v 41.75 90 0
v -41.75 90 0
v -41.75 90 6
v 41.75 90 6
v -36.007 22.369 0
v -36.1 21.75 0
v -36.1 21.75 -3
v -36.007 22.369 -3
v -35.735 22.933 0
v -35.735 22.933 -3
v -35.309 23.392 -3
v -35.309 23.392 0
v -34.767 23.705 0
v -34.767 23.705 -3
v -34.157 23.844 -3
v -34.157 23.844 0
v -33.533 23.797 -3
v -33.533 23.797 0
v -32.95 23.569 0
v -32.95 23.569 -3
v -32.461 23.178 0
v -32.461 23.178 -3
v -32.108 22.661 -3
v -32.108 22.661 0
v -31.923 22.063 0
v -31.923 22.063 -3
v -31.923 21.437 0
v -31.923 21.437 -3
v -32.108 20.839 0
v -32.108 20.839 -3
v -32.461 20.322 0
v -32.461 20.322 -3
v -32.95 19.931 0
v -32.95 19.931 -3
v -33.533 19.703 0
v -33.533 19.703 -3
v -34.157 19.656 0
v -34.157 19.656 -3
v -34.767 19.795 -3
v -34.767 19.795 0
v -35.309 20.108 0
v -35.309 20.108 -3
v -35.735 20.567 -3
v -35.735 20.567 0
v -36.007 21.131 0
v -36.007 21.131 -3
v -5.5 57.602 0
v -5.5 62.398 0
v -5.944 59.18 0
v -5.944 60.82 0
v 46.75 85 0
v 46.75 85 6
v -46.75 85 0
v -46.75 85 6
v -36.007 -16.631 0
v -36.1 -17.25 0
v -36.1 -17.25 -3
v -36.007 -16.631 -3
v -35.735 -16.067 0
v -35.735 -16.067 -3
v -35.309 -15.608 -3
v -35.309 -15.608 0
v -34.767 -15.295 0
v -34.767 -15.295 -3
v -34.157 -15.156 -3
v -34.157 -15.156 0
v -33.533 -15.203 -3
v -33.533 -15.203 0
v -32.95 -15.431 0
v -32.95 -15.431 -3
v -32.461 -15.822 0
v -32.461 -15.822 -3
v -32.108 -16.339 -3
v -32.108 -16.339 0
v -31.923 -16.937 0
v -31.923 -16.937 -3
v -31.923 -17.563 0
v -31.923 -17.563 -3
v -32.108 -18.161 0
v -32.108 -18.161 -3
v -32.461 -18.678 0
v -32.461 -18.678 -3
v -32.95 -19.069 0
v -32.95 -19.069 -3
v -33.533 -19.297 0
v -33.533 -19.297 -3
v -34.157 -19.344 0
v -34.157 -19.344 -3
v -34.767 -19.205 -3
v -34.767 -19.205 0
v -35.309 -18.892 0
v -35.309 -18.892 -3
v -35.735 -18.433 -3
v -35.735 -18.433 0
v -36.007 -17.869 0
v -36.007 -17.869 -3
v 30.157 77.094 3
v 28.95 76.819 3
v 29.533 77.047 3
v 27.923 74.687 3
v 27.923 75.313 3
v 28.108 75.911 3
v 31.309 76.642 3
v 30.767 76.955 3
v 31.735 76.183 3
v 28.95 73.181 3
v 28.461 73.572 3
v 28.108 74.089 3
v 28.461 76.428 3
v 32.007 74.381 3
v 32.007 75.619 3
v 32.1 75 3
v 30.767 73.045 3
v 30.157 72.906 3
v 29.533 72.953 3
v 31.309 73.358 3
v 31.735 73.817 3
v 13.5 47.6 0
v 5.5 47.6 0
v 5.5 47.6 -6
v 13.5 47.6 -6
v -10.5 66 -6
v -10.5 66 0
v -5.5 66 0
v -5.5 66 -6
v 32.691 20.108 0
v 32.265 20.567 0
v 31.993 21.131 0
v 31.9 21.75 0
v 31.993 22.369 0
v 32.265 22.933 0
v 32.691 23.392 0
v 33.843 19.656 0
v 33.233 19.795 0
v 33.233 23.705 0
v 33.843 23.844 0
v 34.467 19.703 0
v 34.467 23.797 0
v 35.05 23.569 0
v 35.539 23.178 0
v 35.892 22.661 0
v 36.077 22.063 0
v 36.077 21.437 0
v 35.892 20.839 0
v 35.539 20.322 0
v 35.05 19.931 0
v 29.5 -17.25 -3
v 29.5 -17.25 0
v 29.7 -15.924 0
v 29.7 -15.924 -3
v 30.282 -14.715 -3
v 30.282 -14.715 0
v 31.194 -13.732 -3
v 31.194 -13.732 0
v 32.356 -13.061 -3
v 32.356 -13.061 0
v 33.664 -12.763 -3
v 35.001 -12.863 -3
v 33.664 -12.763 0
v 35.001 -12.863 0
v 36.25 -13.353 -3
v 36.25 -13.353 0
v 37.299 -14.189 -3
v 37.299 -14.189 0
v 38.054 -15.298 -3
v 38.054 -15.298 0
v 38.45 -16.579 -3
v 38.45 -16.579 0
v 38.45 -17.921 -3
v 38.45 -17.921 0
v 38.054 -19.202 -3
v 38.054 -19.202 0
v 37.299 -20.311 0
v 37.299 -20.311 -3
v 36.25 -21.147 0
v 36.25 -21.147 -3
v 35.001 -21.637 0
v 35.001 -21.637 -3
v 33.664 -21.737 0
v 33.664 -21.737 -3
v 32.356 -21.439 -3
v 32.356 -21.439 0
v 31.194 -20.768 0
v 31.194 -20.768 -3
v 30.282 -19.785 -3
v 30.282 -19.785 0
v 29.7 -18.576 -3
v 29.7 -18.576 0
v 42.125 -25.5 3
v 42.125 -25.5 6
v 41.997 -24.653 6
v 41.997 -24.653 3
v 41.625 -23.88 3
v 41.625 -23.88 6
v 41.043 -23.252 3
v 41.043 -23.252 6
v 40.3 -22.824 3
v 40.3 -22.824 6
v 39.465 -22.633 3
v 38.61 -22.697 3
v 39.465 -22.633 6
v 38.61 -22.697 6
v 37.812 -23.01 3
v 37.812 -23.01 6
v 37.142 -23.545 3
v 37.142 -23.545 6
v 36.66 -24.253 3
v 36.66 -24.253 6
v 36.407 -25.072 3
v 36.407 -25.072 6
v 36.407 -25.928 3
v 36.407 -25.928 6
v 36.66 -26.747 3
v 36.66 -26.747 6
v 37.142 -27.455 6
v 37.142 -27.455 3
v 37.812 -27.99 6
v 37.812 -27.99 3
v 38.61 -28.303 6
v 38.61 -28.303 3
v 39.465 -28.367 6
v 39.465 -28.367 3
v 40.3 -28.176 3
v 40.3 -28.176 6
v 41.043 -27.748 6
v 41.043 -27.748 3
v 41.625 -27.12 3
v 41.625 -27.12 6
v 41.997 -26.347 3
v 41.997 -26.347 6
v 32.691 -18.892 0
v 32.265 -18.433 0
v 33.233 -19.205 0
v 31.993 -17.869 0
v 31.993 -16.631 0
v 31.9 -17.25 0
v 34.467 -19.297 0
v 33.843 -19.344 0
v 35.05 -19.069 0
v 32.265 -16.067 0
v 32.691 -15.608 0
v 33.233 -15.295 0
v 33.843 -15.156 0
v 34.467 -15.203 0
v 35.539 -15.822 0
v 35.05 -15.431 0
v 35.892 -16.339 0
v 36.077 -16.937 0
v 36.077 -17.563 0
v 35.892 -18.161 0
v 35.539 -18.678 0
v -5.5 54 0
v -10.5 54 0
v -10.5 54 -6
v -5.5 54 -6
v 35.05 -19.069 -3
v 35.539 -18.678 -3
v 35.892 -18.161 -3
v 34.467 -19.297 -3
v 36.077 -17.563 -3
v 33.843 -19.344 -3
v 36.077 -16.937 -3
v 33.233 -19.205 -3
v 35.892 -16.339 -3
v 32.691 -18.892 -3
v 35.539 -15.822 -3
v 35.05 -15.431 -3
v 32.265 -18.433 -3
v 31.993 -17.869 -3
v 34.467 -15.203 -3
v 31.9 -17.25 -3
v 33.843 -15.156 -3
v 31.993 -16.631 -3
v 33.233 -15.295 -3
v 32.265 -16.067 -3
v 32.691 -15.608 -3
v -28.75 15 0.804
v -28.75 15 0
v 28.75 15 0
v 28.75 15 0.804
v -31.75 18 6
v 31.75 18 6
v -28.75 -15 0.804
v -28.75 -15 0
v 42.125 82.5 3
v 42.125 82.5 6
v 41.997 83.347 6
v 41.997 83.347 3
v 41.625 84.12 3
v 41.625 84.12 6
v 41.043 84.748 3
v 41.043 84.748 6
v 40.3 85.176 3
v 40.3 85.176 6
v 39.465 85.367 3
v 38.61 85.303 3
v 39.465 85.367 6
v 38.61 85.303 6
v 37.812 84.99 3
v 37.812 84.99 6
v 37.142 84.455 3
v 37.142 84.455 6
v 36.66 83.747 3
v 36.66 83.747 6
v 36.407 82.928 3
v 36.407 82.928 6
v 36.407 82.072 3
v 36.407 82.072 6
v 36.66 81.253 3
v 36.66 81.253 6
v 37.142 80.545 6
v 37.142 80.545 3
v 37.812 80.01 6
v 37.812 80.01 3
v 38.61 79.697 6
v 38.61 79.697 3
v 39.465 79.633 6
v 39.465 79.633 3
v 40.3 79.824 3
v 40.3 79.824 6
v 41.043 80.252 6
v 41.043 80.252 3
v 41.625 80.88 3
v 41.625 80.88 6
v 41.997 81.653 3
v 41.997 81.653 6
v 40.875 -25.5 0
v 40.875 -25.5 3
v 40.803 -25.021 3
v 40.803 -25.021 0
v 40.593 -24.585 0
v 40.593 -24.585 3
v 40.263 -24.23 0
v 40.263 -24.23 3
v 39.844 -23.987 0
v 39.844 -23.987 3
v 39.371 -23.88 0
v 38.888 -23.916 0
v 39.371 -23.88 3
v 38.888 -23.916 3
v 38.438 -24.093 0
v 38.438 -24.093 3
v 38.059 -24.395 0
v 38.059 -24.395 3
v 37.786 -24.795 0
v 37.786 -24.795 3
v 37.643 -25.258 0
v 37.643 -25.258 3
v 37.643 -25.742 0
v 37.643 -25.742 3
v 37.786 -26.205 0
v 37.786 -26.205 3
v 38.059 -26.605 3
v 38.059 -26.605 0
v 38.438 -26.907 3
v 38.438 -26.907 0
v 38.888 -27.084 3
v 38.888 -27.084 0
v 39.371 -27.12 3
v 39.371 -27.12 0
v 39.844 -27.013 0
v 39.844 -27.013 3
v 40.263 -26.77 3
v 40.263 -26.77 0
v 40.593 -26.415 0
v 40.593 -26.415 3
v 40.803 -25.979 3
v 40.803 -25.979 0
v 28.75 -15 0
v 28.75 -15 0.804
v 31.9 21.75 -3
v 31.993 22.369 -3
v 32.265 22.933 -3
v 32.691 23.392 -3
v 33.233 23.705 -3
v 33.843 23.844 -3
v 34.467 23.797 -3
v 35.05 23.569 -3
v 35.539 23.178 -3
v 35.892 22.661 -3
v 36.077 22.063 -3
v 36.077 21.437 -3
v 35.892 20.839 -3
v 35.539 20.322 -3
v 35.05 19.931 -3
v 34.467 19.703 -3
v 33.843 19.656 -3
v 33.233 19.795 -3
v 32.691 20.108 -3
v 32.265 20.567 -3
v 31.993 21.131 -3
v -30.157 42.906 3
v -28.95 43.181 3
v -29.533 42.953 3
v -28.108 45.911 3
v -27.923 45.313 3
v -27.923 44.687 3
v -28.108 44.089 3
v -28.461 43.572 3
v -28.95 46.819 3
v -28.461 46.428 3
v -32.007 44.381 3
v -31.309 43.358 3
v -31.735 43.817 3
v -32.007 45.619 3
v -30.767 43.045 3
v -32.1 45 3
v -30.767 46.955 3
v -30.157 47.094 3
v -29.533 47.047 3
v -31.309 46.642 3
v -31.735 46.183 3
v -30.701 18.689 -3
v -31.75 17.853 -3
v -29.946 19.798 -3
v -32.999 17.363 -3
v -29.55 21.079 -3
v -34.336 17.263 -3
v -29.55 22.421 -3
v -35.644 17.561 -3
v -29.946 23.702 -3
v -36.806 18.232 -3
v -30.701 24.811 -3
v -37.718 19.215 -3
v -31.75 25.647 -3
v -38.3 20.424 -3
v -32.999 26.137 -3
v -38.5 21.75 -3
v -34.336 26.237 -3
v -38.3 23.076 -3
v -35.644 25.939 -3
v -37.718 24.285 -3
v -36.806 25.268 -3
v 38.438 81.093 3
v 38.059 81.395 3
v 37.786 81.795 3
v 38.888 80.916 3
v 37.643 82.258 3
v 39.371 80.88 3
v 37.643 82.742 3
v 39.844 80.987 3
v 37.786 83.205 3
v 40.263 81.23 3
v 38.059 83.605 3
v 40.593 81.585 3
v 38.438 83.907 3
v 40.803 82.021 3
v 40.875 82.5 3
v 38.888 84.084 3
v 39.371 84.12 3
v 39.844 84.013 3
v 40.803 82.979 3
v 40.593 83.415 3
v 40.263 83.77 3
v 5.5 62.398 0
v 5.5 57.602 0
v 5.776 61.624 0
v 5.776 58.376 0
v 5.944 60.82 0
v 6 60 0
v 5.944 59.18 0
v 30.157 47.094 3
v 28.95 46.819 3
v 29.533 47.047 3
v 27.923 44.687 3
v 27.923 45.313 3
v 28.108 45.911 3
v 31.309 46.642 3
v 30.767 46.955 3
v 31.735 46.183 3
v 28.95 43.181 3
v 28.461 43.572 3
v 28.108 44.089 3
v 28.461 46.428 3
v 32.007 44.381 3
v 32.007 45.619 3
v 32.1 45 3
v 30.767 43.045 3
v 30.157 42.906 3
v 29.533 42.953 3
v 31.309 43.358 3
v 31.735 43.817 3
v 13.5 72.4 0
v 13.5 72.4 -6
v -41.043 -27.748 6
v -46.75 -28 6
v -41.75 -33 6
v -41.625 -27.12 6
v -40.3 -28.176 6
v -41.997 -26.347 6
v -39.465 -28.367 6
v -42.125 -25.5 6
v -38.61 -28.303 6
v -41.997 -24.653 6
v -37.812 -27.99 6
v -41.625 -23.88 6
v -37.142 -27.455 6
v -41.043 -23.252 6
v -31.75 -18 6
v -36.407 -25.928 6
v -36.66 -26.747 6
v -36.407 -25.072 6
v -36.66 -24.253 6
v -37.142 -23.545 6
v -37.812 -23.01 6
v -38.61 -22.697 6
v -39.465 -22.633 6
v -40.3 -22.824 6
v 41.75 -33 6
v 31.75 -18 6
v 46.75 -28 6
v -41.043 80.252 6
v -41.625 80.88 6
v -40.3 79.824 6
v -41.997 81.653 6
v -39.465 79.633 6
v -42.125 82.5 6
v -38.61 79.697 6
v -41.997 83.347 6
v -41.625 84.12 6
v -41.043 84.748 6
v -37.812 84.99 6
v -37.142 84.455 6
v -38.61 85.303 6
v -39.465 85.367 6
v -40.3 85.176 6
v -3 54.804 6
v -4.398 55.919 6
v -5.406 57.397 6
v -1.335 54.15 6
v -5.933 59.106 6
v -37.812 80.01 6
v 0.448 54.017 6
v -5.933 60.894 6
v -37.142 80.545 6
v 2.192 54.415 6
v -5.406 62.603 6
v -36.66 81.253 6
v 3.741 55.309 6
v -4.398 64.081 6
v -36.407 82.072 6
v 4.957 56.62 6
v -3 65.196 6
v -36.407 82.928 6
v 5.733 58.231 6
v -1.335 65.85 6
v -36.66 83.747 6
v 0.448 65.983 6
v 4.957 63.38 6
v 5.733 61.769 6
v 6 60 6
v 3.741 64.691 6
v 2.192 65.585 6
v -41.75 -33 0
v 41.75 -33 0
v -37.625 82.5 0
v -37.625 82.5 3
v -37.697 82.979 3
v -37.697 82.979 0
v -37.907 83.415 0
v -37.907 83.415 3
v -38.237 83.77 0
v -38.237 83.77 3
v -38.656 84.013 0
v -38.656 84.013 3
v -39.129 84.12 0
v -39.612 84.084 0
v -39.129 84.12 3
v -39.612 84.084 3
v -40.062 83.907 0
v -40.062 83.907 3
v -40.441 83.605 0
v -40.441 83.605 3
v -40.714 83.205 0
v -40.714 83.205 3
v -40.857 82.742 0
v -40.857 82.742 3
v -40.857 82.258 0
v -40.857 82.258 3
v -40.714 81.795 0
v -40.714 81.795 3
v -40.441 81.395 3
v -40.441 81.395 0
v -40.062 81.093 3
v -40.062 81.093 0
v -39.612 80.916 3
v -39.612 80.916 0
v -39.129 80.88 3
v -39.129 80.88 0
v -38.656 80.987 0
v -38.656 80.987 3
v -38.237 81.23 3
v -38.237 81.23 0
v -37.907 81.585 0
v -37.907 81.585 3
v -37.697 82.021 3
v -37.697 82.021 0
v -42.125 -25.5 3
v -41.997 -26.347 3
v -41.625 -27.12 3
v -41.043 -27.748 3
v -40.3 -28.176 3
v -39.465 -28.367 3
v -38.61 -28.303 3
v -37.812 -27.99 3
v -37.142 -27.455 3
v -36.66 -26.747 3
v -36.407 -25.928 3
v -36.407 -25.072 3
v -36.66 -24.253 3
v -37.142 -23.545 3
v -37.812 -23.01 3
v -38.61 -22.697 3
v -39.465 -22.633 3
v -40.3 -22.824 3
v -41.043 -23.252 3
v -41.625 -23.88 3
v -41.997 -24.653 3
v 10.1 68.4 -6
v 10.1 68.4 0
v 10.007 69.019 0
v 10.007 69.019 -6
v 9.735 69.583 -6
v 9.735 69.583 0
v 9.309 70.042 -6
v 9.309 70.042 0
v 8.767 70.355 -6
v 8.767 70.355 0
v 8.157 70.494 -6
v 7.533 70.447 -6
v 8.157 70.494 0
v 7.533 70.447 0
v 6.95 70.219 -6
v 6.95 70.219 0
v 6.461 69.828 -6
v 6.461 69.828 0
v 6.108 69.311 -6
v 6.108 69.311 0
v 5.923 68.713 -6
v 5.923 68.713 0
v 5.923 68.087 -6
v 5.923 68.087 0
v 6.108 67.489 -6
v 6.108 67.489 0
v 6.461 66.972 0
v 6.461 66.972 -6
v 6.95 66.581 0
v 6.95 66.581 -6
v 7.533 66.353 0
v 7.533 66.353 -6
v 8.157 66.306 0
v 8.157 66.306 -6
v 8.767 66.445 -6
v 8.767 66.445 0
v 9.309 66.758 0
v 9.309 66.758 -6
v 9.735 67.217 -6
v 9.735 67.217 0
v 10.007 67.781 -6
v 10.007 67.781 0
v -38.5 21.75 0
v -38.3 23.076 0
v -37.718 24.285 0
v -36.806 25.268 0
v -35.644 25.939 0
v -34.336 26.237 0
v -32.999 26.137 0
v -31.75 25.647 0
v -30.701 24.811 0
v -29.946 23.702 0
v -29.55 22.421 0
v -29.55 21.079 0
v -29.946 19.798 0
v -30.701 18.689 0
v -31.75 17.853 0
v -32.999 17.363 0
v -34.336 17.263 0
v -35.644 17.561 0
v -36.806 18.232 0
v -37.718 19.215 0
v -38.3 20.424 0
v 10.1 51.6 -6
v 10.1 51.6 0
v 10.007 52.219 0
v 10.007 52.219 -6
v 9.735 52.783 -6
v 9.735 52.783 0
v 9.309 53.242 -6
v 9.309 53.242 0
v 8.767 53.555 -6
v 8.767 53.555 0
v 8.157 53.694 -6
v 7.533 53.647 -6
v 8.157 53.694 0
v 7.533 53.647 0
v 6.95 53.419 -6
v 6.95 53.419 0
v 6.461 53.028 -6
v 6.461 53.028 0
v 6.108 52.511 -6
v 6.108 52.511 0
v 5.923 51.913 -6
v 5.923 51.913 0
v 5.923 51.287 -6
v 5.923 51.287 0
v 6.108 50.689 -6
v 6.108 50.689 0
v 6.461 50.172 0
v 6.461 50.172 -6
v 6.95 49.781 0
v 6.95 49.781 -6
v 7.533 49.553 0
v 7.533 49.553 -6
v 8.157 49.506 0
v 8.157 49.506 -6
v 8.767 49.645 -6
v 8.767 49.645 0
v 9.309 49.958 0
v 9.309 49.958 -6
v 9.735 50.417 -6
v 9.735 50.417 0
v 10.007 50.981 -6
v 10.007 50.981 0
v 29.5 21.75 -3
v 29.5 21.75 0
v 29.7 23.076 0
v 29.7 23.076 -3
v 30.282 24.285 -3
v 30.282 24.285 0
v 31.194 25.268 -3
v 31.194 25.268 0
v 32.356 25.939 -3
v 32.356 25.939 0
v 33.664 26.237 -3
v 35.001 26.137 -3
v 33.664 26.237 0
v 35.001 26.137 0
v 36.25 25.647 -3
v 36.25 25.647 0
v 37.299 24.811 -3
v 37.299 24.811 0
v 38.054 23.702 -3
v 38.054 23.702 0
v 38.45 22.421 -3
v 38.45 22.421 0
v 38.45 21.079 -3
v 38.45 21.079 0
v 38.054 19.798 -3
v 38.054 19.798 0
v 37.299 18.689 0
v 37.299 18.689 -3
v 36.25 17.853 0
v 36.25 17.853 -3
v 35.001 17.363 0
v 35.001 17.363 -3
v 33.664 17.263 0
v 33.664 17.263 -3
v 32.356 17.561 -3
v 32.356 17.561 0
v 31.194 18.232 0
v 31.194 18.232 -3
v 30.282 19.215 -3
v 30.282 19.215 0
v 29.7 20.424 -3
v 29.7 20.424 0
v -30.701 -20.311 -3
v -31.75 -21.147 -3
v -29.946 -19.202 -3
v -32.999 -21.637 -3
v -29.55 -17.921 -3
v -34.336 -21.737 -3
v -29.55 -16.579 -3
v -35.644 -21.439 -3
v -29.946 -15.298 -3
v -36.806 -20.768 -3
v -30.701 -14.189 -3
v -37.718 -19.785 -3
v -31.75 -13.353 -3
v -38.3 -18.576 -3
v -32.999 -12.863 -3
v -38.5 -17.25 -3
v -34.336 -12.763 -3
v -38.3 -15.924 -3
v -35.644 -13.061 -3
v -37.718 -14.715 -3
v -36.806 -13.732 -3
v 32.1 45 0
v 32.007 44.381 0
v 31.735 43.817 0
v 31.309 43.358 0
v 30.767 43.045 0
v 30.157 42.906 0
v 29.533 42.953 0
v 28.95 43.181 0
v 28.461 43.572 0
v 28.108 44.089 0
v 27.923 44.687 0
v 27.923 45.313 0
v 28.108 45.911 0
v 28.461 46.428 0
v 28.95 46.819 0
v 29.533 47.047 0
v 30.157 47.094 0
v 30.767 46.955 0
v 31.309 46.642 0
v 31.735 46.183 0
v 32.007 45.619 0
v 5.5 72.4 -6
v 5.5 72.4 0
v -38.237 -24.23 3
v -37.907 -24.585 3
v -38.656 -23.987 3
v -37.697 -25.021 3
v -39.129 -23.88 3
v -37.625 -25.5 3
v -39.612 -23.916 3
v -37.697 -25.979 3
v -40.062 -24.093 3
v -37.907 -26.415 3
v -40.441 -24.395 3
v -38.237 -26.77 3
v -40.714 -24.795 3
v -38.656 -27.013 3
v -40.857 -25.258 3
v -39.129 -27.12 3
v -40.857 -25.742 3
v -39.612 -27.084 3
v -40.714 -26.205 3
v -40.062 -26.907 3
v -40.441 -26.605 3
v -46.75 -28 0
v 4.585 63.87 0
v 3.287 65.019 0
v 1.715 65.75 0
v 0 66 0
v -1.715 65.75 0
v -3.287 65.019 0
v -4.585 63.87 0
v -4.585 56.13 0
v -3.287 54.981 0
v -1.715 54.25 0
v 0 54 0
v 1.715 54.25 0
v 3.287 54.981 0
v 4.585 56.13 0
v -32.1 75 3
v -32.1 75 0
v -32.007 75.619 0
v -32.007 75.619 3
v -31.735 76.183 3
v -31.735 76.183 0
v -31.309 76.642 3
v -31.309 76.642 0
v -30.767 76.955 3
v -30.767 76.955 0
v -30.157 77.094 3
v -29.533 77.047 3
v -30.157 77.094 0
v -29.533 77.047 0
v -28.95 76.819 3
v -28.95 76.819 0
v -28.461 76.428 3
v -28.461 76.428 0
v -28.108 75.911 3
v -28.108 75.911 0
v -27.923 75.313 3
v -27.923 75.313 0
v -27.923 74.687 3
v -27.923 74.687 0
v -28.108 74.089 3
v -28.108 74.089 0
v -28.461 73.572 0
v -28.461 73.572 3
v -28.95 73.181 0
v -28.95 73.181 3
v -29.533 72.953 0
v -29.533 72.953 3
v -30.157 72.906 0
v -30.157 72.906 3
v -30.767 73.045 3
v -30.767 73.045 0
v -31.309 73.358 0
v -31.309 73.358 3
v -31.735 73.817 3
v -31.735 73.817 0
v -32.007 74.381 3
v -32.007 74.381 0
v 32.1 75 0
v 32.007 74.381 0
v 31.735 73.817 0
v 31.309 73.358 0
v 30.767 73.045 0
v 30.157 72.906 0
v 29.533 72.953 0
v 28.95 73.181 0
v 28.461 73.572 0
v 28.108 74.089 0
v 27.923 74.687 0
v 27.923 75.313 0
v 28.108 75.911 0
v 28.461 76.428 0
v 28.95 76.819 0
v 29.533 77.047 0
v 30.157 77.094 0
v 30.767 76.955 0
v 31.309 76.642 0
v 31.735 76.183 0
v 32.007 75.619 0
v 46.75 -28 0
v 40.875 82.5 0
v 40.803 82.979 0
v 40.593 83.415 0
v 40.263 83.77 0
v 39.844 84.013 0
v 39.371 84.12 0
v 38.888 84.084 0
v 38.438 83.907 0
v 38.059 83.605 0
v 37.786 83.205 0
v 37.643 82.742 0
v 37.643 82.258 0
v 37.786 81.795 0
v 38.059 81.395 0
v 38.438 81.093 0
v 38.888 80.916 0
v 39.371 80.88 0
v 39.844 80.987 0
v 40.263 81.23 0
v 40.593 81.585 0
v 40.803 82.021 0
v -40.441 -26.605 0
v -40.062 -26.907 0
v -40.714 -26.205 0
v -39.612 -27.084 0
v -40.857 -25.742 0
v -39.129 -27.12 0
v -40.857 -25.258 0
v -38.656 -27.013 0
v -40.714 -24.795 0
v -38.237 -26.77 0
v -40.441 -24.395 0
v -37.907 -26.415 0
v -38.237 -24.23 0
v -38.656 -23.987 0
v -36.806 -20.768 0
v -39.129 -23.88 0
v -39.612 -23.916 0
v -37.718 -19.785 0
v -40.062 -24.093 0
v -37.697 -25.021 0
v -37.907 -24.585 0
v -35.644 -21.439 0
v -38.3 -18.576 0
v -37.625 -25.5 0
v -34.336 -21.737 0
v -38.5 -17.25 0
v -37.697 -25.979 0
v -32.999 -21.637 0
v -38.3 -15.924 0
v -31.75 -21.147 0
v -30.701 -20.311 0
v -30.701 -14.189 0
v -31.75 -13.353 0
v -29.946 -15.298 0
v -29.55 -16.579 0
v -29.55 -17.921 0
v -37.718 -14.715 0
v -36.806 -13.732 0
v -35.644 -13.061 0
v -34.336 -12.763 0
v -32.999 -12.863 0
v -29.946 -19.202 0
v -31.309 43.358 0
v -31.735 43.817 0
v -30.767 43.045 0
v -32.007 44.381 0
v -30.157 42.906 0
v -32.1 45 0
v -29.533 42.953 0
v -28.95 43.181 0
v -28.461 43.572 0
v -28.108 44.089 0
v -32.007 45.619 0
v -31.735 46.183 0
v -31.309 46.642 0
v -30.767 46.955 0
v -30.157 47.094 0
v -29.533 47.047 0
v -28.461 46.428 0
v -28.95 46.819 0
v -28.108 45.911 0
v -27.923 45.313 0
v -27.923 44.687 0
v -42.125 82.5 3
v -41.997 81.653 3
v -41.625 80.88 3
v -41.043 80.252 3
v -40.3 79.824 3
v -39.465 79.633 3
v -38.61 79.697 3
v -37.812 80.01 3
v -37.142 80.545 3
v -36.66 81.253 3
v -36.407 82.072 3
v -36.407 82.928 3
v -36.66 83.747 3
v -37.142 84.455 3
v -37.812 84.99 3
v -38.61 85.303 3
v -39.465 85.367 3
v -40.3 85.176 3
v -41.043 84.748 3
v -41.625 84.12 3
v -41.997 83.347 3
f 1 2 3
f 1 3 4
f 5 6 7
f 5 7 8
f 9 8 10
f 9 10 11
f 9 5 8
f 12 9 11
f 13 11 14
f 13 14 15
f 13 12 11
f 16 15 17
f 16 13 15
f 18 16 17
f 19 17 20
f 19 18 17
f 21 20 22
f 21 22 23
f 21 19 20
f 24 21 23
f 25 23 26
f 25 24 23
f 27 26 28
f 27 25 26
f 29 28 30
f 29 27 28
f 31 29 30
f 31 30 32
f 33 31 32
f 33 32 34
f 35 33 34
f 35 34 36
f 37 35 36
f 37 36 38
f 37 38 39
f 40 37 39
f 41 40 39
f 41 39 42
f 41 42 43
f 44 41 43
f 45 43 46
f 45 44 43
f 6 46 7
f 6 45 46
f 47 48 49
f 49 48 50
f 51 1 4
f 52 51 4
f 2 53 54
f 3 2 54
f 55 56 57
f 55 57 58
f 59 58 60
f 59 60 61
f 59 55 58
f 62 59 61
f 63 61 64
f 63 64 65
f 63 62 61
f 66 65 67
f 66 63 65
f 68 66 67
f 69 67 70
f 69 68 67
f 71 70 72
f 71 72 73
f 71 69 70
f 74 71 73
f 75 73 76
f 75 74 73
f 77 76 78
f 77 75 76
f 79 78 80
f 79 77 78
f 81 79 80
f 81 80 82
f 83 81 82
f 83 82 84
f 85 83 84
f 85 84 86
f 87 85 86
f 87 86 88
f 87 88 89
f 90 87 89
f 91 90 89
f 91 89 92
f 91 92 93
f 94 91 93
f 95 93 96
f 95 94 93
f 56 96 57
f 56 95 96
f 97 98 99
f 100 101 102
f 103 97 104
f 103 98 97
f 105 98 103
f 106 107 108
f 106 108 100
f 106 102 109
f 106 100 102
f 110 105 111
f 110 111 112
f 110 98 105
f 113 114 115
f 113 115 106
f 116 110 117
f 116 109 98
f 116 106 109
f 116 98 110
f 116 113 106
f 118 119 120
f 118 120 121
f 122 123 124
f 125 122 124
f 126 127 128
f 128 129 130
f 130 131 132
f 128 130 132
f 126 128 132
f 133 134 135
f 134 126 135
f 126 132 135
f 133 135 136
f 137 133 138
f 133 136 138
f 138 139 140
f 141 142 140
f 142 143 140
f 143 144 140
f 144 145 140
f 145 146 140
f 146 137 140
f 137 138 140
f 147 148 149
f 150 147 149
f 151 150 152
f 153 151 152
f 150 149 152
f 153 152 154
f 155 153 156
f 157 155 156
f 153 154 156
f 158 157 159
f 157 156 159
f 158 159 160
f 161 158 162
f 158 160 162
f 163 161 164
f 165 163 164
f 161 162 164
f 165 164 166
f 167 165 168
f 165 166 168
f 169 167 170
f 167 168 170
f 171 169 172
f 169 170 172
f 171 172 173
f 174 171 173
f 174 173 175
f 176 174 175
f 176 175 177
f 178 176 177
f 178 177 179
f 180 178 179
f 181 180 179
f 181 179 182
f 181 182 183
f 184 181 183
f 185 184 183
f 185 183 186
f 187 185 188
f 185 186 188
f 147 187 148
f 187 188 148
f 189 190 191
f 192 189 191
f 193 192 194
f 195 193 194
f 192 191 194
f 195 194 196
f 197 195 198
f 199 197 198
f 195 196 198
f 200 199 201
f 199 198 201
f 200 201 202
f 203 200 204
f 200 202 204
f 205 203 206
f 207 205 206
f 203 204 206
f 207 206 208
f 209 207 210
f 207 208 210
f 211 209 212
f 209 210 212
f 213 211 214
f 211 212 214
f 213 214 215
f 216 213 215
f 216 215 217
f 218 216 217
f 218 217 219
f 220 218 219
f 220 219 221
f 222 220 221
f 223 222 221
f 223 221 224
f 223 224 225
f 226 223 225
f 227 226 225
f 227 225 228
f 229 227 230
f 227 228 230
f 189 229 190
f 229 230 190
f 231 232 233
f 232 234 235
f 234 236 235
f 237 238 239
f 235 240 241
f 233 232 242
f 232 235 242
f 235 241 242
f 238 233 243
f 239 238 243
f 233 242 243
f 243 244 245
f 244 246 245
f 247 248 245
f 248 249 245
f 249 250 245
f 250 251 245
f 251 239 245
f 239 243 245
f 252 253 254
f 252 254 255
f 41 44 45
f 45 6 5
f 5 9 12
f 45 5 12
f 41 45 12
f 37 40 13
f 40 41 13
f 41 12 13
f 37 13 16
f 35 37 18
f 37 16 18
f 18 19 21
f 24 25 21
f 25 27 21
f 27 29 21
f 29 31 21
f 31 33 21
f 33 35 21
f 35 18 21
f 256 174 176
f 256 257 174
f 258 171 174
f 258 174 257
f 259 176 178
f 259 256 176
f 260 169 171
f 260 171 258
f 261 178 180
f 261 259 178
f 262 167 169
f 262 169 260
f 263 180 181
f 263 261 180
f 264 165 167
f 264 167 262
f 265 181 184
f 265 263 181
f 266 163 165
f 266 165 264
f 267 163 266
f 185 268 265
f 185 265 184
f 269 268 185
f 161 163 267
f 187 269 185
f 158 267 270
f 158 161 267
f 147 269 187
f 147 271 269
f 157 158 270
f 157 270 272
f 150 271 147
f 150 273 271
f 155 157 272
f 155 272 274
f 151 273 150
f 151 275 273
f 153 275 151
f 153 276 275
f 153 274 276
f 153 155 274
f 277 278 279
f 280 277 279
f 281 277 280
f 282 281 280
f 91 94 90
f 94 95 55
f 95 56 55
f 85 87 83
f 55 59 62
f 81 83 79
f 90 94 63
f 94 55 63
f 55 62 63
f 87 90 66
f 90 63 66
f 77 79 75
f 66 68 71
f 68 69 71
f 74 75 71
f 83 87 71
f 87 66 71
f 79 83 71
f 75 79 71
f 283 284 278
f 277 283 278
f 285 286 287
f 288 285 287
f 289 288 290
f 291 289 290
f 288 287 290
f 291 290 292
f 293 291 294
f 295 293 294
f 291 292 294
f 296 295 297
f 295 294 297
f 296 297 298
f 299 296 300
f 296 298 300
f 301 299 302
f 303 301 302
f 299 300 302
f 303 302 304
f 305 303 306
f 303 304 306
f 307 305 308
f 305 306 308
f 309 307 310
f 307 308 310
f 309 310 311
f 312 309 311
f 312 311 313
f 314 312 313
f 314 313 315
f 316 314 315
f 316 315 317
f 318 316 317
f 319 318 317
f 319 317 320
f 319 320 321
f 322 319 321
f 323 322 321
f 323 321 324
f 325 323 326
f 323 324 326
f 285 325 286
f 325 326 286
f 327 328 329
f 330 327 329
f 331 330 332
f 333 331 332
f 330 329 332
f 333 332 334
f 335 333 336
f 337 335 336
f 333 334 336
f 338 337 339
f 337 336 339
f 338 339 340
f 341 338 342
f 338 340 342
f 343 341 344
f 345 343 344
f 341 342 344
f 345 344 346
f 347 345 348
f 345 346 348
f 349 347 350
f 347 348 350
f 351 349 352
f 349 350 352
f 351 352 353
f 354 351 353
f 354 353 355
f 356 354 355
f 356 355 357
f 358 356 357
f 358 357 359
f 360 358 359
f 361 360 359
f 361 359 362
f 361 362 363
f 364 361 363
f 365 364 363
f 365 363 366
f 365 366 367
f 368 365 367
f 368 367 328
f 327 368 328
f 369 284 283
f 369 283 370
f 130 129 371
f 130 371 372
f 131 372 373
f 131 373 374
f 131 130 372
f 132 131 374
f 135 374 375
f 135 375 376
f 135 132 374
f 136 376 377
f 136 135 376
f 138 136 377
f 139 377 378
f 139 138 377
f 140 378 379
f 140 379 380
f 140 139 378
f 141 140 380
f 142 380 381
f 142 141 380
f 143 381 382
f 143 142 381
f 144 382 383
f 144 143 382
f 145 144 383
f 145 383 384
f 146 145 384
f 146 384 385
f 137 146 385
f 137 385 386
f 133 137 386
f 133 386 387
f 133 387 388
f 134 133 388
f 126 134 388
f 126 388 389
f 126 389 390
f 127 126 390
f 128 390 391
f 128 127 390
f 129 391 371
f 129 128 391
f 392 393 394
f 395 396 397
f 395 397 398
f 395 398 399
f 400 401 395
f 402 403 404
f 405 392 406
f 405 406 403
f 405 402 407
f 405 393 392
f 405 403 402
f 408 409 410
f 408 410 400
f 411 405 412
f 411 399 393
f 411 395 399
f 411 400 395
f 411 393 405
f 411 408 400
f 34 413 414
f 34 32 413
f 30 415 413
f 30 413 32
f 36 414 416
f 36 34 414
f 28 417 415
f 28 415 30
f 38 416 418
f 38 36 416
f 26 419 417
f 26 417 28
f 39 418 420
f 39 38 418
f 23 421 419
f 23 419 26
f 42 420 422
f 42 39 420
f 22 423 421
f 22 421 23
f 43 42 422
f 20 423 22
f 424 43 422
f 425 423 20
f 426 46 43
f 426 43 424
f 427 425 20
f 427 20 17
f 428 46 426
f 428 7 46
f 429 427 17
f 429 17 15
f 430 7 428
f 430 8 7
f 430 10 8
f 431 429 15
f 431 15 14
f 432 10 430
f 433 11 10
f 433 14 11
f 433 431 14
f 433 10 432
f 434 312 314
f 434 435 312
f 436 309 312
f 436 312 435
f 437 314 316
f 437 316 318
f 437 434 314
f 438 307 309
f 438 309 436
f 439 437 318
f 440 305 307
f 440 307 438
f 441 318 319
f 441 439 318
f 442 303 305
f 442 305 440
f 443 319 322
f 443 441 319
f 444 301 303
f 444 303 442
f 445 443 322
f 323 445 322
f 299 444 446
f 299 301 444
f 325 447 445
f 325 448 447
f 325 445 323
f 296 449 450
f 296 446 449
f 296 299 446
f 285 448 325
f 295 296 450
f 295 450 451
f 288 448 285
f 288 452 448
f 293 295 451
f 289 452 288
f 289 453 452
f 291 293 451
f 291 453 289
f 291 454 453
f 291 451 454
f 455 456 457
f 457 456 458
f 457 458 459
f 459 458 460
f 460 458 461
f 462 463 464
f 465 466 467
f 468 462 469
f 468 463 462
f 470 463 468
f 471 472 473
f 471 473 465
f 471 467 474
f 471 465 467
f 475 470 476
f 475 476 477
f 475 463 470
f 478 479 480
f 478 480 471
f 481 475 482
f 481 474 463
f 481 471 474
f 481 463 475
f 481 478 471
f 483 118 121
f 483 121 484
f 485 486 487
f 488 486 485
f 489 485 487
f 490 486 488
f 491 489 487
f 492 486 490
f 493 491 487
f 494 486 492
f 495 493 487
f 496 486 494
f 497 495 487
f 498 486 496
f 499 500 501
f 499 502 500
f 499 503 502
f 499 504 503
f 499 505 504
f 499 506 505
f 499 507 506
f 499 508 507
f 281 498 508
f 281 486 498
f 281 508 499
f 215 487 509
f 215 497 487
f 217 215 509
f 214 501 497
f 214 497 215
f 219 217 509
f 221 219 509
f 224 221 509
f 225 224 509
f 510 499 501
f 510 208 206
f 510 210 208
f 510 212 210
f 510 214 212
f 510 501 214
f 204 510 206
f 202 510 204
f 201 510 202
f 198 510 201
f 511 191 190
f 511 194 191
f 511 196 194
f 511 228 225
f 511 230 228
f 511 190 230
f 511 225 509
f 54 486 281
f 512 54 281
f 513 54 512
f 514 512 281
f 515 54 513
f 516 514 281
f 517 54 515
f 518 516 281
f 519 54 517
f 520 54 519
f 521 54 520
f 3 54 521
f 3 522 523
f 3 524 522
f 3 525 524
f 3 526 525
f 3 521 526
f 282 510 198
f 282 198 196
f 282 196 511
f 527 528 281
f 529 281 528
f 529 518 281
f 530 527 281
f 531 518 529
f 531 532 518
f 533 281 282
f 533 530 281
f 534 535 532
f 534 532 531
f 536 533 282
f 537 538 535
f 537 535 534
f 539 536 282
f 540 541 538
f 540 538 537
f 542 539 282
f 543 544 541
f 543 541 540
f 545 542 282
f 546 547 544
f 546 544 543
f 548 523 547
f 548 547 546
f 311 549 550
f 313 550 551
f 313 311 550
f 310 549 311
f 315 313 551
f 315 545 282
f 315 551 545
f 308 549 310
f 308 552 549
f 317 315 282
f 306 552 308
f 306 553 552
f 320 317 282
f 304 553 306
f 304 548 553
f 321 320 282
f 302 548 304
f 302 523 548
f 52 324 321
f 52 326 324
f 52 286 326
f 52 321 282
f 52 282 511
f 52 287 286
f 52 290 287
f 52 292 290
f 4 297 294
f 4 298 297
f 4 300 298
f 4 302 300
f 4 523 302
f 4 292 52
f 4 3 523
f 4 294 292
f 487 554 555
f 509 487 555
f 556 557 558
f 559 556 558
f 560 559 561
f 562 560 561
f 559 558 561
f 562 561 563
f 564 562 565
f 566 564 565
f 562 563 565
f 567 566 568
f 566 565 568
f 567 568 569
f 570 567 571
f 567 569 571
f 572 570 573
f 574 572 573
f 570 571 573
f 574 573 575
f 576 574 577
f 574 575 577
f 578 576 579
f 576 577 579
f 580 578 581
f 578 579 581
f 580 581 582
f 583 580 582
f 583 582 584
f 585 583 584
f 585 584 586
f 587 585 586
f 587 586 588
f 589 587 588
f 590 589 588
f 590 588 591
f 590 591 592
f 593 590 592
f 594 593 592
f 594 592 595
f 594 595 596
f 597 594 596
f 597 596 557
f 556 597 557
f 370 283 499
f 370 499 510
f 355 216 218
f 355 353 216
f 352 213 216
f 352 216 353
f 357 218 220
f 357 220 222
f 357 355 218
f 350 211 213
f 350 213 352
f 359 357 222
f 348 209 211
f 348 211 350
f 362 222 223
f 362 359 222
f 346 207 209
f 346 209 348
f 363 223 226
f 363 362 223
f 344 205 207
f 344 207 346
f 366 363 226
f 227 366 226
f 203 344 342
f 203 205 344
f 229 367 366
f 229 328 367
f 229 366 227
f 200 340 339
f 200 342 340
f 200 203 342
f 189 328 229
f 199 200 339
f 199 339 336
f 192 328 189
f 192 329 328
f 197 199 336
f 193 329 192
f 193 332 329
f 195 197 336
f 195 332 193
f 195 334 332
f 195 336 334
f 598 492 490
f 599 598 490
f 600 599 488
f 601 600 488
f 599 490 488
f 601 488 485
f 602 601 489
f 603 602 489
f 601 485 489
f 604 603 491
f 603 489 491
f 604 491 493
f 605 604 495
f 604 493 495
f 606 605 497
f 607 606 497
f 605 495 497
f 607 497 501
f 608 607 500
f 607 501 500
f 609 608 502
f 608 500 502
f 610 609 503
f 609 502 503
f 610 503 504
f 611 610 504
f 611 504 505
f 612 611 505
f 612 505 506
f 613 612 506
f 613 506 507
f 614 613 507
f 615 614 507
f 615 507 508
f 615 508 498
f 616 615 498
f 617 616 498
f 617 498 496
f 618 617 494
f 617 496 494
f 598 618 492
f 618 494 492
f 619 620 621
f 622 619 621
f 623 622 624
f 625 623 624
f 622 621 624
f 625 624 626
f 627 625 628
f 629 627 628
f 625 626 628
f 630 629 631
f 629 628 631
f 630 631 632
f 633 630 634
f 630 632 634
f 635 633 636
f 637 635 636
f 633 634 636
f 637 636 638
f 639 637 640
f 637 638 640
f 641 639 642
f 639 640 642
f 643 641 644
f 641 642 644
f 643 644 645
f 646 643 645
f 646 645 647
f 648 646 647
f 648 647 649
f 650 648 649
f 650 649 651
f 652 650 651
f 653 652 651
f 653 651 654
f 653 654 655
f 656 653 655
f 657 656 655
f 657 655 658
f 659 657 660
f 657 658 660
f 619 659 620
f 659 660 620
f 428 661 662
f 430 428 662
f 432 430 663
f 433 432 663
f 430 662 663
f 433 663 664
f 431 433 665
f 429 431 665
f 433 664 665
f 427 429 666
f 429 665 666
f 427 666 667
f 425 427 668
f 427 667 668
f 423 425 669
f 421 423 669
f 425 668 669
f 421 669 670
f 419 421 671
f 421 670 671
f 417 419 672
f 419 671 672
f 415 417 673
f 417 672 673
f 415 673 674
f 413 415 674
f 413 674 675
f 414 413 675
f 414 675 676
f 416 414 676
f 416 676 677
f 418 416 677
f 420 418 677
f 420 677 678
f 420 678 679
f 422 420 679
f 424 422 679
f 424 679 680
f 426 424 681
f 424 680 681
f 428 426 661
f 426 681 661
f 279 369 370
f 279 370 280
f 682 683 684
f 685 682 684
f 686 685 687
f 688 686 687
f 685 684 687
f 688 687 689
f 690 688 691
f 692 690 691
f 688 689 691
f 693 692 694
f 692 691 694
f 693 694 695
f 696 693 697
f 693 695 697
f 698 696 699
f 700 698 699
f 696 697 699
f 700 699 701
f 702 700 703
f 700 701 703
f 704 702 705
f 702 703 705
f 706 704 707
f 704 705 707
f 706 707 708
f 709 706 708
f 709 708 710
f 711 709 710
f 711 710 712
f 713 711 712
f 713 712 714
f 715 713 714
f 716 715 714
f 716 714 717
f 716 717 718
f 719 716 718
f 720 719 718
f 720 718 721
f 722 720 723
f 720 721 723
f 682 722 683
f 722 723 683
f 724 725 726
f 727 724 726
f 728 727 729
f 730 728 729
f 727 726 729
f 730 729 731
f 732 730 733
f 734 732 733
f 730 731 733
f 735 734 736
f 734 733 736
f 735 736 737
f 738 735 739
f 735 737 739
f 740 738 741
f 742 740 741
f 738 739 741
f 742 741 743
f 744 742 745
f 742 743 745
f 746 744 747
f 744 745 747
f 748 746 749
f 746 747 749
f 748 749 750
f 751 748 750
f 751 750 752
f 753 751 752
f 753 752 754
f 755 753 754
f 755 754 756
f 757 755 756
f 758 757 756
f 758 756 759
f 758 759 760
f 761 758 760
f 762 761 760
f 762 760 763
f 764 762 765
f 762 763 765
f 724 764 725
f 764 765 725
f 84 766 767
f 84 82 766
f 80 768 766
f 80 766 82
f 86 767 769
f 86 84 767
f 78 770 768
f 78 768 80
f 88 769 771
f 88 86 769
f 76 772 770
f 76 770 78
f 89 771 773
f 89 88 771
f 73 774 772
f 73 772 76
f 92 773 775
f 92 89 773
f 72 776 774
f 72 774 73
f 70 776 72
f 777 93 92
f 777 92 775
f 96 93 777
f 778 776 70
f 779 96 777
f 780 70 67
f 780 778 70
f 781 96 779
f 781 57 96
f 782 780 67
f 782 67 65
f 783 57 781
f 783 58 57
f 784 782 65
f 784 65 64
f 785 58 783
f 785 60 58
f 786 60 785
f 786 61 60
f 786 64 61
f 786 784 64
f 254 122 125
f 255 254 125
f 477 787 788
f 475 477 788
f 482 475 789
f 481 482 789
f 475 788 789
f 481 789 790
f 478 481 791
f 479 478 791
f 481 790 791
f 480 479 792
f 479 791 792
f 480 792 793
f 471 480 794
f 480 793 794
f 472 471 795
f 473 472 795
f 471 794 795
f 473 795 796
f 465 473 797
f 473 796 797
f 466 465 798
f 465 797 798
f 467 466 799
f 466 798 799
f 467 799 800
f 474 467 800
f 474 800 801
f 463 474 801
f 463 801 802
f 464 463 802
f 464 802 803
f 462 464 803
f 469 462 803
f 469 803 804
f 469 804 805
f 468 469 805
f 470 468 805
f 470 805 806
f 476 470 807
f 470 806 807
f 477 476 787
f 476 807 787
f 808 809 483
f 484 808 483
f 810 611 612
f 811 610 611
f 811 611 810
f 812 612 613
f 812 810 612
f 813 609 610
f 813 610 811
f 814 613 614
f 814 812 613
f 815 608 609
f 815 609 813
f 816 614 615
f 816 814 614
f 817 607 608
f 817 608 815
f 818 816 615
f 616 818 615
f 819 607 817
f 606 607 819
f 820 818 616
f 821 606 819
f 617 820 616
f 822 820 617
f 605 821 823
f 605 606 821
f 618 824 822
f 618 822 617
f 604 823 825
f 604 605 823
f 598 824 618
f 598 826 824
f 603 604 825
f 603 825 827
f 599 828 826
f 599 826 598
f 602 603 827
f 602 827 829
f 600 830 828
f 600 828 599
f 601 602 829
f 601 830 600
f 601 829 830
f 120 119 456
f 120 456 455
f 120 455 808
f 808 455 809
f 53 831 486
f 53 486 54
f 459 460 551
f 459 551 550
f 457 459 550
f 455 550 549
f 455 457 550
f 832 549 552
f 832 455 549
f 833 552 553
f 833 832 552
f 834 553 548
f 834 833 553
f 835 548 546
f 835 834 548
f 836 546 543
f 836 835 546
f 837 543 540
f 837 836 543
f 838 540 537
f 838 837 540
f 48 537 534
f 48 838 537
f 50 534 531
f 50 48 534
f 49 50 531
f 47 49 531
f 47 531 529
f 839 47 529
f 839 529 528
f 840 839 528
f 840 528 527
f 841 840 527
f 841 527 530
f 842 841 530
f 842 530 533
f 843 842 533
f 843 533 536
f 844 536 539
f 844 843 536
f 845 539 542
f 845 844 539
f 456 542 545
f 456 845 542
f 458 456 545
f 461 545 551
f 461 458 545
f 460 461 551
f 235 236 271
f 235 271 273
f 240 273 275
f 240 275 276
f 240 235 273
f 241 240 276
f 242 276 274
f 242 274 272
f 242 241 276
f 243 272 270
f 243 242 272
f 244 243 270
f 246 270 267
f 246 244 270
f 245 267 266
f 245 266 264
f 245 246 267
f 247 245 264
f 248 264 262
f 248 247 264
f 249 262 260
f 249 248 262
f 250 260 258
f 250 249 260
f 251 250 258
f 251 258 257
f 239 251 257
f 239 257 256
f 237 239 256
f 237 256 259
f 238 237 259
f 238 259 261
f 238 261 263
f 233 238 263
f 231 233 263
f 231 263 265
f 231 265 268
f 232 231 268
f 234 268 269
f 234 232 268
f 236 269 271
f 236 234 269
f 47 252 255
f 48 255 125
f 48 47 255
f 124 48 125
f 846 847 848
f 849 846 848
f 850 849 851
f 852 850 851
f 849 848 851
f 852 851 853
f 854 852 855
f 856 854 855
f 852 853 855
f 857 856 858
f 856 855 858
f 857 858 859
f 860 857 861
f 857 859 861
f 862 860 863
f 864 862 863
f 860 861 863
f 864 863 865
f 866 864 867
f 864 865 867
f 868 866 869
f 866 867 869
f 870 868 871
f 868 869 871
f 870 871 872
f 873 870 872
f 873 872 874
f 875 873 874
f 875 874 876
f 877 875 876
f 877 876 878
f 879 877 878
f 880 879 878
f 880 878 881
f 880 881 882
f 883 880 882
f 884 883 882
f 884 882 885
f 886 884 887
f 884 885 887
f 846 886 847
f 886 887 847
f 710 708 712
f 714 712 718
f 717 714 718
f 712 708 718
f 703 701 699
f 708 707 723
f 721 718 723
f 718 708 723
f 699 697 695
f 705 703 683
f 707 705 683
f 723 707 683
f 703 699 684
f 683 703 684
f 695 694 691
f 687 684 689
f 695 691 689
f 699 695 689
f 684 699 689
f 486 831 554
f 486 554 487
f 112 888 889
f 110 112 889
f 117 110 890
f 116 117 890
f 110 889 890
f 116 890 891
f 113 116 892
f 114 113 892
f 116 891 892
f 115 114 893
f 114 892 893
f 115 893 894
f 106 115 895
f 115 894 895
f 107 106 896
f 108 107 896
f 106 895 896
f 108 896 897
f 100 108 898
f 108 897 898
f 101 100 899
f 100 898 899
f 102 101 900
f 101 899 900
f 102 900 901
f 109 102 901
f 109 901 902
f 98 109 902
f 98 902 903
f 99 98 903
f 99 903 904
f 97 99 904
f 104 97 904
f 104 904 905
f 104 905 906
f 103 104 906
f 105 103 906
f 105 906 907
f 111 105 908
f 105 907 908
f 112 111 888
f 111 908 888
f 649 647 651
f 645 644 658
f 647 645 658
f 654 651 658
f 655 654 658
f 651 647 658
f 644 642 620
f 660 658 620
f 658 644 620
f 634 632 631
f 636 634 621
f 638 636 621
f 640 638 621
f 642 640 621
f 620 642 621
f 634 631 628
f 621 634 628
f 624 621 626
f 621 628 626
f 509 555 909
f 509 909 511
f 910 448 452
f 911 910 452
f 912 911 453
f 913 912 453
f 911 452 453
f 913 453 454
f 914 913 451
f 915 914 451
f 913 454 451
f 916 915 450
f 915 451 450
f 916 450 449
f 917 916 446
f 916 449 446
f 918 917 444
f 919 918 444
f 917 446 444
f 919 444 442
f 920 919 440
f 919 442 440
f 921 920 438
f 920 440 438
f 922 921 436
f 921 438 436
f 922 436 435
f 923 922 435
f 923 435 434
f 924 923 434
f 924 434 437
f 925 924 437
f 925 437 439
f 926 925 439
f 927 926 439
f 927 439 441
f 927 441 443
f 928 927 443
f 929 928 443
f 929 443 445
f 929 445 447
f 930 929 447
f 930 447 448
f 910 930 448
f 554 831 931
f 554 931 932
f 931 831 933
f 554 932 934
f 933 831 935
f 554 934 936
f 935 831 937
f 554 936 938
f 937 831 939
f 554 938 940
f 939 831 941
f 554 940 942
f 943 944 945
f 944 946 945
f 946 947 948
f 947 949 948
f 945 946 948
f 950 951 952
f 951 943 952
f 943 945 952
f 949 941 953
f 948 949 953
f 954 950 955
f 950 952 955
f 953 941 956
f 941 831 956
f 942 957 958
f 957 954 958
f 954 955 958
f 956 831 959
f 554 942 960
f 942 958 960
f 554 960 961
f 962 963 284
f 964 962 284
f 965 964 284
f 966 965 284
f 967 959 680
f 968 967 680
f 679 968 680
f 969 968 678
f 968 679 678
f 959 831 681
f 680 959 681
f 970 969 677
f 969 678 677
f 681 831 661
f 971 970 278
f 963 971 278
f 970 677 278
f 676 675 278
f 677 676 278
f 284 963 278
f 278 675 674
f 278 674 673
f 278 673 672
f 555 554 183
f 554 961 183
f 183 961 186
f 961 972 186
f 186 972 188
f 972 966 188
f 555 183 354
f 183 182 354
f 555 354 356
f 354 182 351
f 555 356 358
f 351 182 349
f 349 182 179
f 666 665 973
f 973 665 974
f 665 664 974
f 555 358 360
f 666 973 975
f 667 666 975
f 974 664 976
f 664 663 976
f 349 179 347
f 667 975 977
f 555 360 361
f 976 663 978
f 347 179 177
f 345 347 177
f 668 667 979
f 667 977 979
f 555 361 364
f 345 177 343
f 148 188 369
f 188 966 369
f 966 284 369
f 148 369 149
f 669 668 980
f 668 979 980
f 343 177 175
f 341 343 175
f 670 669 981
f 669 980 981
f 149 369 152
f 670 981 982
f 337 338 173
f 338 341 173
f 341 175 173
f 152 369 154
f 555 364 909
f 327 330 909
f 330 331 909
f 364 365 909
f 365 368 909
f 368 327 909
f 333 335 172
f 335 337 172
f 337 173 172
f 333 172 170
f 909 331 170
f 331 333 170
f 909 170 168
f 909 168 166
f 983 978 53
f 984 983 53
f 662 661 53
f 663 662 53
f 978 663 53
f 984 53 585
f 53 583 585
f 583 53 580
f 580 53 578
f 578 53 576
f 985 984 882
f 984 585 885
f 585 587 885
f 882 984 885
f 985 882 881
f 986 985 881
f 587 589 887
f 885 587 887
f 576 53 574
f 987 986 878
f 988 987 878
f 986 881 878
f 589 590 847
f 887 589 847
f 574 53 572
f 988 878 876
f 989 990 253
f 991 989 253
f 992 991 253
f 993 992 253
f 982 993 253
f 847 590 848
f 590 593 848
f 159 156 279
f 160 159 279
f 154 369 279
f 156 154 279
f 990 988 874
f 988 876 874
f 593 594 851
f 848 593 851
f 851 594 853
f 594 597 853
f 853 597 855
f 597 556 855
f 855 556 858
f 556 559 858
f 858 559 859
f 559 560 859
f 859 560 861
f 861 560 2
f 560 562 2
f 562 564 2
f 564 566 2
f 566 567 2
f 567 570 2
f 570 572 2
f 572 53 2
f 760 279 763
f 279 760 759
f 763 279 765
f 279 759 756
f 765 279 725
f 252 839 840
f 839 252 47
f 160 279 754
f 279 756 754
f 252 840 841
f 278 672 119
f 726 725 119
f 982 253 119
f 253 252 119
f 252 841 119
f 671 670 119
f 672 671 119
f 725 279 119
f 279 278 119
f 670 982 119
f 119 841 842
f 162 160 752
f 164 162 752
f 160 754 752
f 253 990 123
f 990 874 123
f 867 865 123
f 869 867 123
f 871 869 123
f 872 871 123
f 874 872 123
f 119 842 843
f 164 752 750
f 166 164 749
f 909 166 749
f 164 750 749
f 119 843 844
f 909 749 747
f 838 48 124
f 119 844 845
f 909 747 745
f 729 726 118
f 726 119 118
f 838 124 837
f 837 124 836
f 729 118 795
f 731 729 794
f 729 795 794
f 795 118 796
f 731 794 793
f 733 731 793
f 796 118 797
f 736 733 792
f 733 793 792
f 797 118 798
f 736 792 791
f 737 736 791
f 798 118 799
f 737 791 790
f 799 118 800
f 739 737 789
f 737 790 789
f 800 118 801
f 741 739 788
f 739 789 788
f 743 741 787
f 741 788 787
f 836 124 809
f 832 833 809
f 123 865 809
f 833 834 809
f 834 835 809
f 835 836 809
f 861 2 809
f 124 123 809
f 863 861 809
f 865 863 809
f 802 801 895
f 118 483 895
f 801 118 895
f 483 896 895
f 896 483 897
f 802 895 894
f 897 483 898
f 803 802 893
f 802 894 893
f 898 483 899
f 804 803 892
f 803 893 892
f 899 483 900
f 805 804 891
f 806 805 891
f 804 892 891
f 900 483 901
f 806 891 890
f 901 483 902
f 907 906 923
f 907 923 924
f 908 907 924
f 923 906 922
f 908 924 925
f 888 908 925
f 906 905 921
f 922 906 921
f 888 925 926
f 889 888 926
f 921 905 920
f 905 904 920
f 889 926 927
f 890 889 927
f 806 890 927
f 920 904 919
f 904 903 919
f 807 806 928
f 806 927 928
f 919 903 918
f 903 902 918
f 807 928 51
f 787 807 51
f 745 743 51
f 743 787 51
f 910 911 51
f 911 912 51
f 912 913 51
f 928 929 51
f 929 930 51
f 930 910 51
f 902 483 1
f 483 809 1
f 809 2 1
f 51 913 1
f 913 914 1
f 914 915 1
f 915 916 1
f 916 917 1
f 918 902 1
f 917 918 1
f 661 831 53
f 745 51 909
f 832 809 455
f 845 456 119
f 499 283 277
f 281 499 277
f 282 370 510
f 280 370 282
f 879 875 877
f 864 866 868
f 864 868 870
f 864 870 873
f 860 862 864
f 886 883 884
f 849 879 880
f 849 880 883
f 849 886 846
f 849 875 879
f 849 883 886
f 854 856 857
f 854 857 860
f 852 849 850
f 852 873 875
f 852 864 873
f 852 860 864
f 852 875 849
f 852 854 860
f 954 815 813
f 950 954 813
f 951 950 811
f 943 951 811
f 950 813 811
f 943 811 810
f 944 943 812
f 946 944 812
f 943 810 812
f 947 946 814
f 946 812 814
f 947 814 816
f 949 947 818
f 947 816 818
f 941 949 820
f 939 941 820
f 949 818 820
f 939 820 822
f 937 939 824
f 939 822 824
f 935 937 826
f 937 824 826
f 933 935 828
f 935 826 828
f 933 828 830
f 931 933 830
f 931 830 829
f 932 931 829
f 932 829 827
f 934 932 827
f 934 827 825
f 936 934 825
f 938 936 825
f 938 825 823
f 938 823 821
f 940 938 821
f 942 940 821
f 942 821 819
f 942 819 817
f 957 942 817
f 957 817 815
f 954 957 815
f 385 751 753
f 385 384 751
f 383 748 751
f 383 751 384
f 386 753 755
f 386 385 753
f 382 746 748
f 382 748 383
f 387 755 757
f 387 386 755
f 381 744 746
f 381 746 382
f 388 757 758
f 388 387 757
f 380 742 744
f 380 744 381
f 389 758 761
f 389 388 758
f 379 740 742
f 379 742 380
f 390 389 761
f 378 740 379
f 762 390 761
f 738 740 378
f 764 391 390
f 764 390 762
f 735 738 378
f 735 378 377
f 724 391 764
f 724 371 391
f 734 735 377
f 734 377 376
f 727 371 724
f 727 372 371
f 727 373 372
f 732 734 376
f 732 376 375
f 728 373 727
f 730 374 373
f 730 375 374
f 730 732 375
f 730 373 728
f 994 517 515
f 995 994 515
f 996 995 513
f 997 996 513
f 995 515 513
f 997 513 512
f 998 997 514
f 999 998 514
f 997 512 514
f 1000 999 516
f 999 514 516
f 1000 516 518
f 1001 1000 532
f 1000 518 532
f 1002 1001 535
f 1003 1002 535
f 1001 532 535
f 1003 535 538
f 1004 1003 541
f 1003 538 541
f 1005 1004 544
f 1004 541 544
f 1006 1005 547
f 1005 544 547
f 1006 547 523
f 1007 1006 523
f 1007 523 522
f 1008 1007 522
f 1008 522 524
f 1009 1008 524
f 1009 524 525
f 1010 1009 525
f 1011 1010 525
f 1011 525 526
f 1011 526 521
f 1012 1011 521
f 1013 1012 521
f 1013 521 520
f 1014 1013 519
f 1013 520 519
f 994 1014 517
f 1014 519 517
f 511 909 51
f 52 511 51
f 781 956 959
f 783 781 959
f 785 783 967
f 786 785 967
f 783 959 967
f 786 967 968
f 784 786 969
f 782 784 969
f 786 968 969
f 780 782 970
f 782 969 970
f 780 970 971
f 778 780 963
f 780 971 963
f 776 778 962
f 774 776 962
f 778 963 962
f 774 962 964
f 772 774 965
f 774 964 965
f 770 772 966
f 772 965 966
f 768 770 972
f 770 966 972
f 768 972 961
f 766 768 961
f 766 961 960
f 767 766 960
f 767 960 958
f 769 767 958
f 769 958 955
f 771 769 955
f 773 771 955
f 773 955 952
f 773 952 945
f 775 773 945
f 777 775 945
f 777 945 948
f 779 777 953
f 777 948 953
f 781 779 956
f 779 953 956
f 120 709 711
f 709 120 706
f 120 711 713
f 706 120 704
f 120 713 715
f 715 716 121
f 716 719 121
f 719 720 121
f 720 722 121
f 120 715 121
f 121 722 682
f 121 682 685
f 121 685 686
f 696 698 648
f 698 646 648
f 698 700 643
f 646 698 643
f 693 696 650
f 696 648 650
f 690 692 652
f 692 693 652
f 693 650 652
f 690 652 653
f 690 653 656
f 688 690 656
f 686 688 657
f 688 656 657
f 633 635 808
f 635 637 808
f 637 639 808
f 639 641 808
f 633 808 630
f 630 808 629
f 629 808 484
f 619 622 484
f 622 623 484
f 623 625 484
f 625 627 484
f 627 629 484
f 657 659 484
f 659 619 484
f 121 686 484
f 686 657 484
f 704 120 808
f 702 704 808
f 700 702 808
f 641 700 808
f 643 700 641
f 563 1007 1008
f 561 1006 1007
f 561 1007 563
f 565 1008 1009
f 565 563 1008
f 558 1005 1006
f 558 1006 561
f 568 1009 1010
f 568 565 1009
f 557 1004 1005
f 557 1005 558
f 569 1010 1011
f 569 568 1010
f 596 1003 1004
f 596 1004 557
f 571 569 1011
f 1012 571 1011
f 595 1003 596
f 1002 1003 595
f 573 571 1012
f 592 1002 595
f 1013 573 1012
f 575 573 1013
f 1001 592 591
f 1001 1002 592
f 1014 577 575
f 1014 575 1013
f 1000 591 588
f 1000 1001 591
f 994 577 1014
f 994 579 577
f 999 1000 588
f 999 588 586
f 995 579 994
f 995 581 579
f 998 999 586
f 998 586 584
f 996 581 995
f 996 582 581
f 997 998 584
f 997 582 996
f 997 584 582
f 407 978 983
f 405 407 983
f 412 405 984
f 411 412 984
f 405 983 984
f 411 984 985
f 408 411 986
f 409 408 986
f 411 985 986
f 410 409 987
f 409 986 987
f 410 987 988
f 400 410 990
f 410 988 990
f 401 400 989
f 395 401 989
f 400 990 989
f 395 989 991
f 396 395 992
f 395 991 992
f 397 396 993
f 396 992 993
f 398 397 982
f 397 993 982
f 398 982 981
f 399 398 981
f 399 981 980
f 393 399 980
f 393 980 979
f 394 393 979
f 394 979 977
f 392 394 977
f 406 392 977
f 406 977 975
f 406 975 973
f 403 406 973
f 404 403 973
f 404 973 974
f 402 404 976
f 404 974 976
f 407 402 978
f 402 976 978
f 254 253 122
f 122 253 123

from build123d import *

# Parameters (mm, degrees)
SKETCH1_W           = 93.5
SKETCH1_H           = 123
SKETCH1_R           = 6
SKETCH1_W_2         = 57.5
SKETCH1_H_2         = 30
BOSS_EXTRUDE1_DEPTH = 6
SKETCH2_R           = 4.5
SKETCH2_R_2         = 2.1
BOSS_EXTRUDE2_DEPTH = 3
CHAMFER2_SIZE       = 5
SKETCH5_R           = 2.875
CUT_EXTRUDE2_DEPTH  = 3
SKETCH6_R           = 1.625
CUT_EXTRUDE3_DEPTH  = 23
SKETCH7_W           = 5
SKETCH7_H           = 12
SKETCH7_W_2         = 8
SKETCH7_H_2         = 24.8
SKETCH7_R           = 2.1
BOSS_EXTRUDE3_DEPTH = 6
CHAMFER3_SIZE       = 3
CHAMFER3_SIZE2      = 5.196152423
SKETCH9_R           = 2.1
CUT_EXTRUDE5_DEPTH  = 3


with BuildPart() as part:
    # Sketch1 → Boss-Extrude1 (new body)
    with BuildSketch(Plane.XY):
        with Locations((0, 28.5)):
            Rectangle(SKETCH1_W, SKETCH1_H)
        with Locations((0, 60)):
            Circle(SKETCH1_R, mode=Mode.SUBTRACT)
        Rectangle(SKETCH1_W_2, SKETCH1_H_2, mode=Mode.SUBTRACT)
    extrude(amount=BOSS_EXTRUDE1_DEPTH)

    # Sketch2 → Boss-Extrude2 (add)
    # profile 1 of 4: a face of its own
    with BuildSketch(Plane(origin=(0, 0, 0), x_dir=(-1, 0, 0), z_dir=(0, 0, -1))):
        with Locations((34, 21.75)):
            Circle(SKETCH2_R)
        with Locations((34, 21.75)):
            Circle(SKETCH2_R_2, mode=Mode.SUBTRACT)
    # profile 2 of 4: a face of its own
    with BuildSketch(Plane(origin=(0, 0, 0), x_dir=(-1, 0, 0), z_dir=(0, 0, -1))):
        with Locations((-34, -17.25)):
            Circle(SKETCH2_R)
        with Locations((-34, -17.25)):
            Circle(SKETCH2_R_2, mode=Mode.SUBTRACT)
    # profile 3 of 4: a face of its own
    with BuildSketch(Plane(origin=(0, 0, 0), x_dir=(-1, 0, 0), z_dir=(0, 0, -1))):
        with Locations((34, -17.25)):
            Circle(SKETCH2_R)
        with Locations((34, -17.25)):
            Circle(SKETCH2_R_2, mode=Mode.SUBTRACT)
    # profile 4 of 4: a face of its own
    with BuildSketch(Plane(origin=(0, 0, 0), x_dir=(-1, 0, 0), z_dir=(0, 0, -1))):
        with Locations((-34, 21.75)):
            Circle(SKETCH2_R)
        with Locations((-34, 21.75)):
            Circle(SKETCH2_R_2, mode=Mode.SUBTRACT)
    extrude(amount=BOSS_EXTRUDE2_DEPTH)

    # Chamfer2
    chamfer2_edges = [part.edges().sort_by_distance(p)[0] for p in [
        (-46.75, 90, 3),
        (46.75, 90, 3),
        (46.75, -33, 3),
        (-46.75, -33, 3),
    ]]
    chamfer(chamfer2_edges, length=CHAMFER2_SIZE)

    # Sketch5 → Cut-Extrude2 (cut)
    with BuildSketch(Plane.XY.offset(6)):
        with Locations((39.25, -25.5)):
            Circle(SKETCH5_R)
        with Locations((39.25, 82.5)):
            Circle(SKETCH5_R)
        with Locations(Location((-39.25, -25.5, 0), (0, 0, 180))):
            Circle(SKETCH5_R)
        with Locations(Location((-39.25, 82.5, 0), (0, 0, 180))):
            Circle(SKETCH5_R)
    extrude(amount=-CUT_EXTRUDE2_DEPTH, mode=Mode.SUBTRACT)

    # Sketch6 → Cut-Extrude3 (cut)
    with BuildSketch(Plane.XY.offset(3)):
        with Locations((39.25, -25.5)):
            Circle(SKETCH6_R)
        with Locations((-39.25, -25.5)):
            Circle(SKETCH6_R)
        with Locations((-39.25, 82.5)):
            Circle(SKETCH6_R)
        with Locations((39.25, 82.5)):
            Circle(SKETCH6_R)
    extrude(amount=-CUT_EXTRUDE3_DEPTH, mode=Mode.SUBTRACT)

    # Sketch7 → Boss-Extrude3 (add)
    # profile 1 of 2: a face of its own
    with BuildSketch(Plane.XY):
        with Locations((-8, 60)):
            Rectangle(SKETCH7_W, SKETCH7_H)
    # profile 2 of 2: a face of its own
    with BuildSketch(Plane.XY):
        with Locations((9.5, 60)):
            Rectangle(SKETCH7_W_2, SKETCH7_H_2)
        with Locations((8, 51.6)):
            Circle(SKETCH7_R, mode=Mode.SUBTRACT)
        with Locations((8, 68.4)):
            Circle(SKETCH7_R, mode=Mode.SUBTRACT)
    extrude(amount=-BOSS_EXTRUDE3_DEPTH)

    # Chamfer3
    chamfer3_edges = [part.edges().sort_by_distance(p)[0] for p in [
        (-28.75, 0, 6),
        (0, -15, 6),
        (28.75, 0, 6),
        (0, 15, 6),
    ]]
    chamfer3_side = [part.faces().sort_by_distance(p)[0] for p in [
        (0, 33.295685128, 6),
    ]]
    chamfer(chamfer3_edges, length=CHAMFER3_SIZE, length2=CHAMFER3_SIZE2, reference=chamfer3_side[0])

    # Sketch9 → Cut-Extrude5 (cut)
    with BuildSketch(Plane(origin=(0, 0, 0), x_dir=(-1, 0, 0), z_dir=(0, 0, -1))):
        with Locations((30, 75)):
            Circle(SKETCH9_R)
        with Locations((30, 45)):
            Circle(SKETCH9_R)
        with Locations(Location((-30, 45, 0), (0, 0, 180))):
            Circle(SKETCH9_R)
        with Locations(Location((-30, 75, 0), (0, 0, 180))):
            Circle(SKETCH9_R)
    extrude(amount=-CUT_EXTRUDE5_DEPTH, mode=Mode.SUBTRACT)


solid = part.part
